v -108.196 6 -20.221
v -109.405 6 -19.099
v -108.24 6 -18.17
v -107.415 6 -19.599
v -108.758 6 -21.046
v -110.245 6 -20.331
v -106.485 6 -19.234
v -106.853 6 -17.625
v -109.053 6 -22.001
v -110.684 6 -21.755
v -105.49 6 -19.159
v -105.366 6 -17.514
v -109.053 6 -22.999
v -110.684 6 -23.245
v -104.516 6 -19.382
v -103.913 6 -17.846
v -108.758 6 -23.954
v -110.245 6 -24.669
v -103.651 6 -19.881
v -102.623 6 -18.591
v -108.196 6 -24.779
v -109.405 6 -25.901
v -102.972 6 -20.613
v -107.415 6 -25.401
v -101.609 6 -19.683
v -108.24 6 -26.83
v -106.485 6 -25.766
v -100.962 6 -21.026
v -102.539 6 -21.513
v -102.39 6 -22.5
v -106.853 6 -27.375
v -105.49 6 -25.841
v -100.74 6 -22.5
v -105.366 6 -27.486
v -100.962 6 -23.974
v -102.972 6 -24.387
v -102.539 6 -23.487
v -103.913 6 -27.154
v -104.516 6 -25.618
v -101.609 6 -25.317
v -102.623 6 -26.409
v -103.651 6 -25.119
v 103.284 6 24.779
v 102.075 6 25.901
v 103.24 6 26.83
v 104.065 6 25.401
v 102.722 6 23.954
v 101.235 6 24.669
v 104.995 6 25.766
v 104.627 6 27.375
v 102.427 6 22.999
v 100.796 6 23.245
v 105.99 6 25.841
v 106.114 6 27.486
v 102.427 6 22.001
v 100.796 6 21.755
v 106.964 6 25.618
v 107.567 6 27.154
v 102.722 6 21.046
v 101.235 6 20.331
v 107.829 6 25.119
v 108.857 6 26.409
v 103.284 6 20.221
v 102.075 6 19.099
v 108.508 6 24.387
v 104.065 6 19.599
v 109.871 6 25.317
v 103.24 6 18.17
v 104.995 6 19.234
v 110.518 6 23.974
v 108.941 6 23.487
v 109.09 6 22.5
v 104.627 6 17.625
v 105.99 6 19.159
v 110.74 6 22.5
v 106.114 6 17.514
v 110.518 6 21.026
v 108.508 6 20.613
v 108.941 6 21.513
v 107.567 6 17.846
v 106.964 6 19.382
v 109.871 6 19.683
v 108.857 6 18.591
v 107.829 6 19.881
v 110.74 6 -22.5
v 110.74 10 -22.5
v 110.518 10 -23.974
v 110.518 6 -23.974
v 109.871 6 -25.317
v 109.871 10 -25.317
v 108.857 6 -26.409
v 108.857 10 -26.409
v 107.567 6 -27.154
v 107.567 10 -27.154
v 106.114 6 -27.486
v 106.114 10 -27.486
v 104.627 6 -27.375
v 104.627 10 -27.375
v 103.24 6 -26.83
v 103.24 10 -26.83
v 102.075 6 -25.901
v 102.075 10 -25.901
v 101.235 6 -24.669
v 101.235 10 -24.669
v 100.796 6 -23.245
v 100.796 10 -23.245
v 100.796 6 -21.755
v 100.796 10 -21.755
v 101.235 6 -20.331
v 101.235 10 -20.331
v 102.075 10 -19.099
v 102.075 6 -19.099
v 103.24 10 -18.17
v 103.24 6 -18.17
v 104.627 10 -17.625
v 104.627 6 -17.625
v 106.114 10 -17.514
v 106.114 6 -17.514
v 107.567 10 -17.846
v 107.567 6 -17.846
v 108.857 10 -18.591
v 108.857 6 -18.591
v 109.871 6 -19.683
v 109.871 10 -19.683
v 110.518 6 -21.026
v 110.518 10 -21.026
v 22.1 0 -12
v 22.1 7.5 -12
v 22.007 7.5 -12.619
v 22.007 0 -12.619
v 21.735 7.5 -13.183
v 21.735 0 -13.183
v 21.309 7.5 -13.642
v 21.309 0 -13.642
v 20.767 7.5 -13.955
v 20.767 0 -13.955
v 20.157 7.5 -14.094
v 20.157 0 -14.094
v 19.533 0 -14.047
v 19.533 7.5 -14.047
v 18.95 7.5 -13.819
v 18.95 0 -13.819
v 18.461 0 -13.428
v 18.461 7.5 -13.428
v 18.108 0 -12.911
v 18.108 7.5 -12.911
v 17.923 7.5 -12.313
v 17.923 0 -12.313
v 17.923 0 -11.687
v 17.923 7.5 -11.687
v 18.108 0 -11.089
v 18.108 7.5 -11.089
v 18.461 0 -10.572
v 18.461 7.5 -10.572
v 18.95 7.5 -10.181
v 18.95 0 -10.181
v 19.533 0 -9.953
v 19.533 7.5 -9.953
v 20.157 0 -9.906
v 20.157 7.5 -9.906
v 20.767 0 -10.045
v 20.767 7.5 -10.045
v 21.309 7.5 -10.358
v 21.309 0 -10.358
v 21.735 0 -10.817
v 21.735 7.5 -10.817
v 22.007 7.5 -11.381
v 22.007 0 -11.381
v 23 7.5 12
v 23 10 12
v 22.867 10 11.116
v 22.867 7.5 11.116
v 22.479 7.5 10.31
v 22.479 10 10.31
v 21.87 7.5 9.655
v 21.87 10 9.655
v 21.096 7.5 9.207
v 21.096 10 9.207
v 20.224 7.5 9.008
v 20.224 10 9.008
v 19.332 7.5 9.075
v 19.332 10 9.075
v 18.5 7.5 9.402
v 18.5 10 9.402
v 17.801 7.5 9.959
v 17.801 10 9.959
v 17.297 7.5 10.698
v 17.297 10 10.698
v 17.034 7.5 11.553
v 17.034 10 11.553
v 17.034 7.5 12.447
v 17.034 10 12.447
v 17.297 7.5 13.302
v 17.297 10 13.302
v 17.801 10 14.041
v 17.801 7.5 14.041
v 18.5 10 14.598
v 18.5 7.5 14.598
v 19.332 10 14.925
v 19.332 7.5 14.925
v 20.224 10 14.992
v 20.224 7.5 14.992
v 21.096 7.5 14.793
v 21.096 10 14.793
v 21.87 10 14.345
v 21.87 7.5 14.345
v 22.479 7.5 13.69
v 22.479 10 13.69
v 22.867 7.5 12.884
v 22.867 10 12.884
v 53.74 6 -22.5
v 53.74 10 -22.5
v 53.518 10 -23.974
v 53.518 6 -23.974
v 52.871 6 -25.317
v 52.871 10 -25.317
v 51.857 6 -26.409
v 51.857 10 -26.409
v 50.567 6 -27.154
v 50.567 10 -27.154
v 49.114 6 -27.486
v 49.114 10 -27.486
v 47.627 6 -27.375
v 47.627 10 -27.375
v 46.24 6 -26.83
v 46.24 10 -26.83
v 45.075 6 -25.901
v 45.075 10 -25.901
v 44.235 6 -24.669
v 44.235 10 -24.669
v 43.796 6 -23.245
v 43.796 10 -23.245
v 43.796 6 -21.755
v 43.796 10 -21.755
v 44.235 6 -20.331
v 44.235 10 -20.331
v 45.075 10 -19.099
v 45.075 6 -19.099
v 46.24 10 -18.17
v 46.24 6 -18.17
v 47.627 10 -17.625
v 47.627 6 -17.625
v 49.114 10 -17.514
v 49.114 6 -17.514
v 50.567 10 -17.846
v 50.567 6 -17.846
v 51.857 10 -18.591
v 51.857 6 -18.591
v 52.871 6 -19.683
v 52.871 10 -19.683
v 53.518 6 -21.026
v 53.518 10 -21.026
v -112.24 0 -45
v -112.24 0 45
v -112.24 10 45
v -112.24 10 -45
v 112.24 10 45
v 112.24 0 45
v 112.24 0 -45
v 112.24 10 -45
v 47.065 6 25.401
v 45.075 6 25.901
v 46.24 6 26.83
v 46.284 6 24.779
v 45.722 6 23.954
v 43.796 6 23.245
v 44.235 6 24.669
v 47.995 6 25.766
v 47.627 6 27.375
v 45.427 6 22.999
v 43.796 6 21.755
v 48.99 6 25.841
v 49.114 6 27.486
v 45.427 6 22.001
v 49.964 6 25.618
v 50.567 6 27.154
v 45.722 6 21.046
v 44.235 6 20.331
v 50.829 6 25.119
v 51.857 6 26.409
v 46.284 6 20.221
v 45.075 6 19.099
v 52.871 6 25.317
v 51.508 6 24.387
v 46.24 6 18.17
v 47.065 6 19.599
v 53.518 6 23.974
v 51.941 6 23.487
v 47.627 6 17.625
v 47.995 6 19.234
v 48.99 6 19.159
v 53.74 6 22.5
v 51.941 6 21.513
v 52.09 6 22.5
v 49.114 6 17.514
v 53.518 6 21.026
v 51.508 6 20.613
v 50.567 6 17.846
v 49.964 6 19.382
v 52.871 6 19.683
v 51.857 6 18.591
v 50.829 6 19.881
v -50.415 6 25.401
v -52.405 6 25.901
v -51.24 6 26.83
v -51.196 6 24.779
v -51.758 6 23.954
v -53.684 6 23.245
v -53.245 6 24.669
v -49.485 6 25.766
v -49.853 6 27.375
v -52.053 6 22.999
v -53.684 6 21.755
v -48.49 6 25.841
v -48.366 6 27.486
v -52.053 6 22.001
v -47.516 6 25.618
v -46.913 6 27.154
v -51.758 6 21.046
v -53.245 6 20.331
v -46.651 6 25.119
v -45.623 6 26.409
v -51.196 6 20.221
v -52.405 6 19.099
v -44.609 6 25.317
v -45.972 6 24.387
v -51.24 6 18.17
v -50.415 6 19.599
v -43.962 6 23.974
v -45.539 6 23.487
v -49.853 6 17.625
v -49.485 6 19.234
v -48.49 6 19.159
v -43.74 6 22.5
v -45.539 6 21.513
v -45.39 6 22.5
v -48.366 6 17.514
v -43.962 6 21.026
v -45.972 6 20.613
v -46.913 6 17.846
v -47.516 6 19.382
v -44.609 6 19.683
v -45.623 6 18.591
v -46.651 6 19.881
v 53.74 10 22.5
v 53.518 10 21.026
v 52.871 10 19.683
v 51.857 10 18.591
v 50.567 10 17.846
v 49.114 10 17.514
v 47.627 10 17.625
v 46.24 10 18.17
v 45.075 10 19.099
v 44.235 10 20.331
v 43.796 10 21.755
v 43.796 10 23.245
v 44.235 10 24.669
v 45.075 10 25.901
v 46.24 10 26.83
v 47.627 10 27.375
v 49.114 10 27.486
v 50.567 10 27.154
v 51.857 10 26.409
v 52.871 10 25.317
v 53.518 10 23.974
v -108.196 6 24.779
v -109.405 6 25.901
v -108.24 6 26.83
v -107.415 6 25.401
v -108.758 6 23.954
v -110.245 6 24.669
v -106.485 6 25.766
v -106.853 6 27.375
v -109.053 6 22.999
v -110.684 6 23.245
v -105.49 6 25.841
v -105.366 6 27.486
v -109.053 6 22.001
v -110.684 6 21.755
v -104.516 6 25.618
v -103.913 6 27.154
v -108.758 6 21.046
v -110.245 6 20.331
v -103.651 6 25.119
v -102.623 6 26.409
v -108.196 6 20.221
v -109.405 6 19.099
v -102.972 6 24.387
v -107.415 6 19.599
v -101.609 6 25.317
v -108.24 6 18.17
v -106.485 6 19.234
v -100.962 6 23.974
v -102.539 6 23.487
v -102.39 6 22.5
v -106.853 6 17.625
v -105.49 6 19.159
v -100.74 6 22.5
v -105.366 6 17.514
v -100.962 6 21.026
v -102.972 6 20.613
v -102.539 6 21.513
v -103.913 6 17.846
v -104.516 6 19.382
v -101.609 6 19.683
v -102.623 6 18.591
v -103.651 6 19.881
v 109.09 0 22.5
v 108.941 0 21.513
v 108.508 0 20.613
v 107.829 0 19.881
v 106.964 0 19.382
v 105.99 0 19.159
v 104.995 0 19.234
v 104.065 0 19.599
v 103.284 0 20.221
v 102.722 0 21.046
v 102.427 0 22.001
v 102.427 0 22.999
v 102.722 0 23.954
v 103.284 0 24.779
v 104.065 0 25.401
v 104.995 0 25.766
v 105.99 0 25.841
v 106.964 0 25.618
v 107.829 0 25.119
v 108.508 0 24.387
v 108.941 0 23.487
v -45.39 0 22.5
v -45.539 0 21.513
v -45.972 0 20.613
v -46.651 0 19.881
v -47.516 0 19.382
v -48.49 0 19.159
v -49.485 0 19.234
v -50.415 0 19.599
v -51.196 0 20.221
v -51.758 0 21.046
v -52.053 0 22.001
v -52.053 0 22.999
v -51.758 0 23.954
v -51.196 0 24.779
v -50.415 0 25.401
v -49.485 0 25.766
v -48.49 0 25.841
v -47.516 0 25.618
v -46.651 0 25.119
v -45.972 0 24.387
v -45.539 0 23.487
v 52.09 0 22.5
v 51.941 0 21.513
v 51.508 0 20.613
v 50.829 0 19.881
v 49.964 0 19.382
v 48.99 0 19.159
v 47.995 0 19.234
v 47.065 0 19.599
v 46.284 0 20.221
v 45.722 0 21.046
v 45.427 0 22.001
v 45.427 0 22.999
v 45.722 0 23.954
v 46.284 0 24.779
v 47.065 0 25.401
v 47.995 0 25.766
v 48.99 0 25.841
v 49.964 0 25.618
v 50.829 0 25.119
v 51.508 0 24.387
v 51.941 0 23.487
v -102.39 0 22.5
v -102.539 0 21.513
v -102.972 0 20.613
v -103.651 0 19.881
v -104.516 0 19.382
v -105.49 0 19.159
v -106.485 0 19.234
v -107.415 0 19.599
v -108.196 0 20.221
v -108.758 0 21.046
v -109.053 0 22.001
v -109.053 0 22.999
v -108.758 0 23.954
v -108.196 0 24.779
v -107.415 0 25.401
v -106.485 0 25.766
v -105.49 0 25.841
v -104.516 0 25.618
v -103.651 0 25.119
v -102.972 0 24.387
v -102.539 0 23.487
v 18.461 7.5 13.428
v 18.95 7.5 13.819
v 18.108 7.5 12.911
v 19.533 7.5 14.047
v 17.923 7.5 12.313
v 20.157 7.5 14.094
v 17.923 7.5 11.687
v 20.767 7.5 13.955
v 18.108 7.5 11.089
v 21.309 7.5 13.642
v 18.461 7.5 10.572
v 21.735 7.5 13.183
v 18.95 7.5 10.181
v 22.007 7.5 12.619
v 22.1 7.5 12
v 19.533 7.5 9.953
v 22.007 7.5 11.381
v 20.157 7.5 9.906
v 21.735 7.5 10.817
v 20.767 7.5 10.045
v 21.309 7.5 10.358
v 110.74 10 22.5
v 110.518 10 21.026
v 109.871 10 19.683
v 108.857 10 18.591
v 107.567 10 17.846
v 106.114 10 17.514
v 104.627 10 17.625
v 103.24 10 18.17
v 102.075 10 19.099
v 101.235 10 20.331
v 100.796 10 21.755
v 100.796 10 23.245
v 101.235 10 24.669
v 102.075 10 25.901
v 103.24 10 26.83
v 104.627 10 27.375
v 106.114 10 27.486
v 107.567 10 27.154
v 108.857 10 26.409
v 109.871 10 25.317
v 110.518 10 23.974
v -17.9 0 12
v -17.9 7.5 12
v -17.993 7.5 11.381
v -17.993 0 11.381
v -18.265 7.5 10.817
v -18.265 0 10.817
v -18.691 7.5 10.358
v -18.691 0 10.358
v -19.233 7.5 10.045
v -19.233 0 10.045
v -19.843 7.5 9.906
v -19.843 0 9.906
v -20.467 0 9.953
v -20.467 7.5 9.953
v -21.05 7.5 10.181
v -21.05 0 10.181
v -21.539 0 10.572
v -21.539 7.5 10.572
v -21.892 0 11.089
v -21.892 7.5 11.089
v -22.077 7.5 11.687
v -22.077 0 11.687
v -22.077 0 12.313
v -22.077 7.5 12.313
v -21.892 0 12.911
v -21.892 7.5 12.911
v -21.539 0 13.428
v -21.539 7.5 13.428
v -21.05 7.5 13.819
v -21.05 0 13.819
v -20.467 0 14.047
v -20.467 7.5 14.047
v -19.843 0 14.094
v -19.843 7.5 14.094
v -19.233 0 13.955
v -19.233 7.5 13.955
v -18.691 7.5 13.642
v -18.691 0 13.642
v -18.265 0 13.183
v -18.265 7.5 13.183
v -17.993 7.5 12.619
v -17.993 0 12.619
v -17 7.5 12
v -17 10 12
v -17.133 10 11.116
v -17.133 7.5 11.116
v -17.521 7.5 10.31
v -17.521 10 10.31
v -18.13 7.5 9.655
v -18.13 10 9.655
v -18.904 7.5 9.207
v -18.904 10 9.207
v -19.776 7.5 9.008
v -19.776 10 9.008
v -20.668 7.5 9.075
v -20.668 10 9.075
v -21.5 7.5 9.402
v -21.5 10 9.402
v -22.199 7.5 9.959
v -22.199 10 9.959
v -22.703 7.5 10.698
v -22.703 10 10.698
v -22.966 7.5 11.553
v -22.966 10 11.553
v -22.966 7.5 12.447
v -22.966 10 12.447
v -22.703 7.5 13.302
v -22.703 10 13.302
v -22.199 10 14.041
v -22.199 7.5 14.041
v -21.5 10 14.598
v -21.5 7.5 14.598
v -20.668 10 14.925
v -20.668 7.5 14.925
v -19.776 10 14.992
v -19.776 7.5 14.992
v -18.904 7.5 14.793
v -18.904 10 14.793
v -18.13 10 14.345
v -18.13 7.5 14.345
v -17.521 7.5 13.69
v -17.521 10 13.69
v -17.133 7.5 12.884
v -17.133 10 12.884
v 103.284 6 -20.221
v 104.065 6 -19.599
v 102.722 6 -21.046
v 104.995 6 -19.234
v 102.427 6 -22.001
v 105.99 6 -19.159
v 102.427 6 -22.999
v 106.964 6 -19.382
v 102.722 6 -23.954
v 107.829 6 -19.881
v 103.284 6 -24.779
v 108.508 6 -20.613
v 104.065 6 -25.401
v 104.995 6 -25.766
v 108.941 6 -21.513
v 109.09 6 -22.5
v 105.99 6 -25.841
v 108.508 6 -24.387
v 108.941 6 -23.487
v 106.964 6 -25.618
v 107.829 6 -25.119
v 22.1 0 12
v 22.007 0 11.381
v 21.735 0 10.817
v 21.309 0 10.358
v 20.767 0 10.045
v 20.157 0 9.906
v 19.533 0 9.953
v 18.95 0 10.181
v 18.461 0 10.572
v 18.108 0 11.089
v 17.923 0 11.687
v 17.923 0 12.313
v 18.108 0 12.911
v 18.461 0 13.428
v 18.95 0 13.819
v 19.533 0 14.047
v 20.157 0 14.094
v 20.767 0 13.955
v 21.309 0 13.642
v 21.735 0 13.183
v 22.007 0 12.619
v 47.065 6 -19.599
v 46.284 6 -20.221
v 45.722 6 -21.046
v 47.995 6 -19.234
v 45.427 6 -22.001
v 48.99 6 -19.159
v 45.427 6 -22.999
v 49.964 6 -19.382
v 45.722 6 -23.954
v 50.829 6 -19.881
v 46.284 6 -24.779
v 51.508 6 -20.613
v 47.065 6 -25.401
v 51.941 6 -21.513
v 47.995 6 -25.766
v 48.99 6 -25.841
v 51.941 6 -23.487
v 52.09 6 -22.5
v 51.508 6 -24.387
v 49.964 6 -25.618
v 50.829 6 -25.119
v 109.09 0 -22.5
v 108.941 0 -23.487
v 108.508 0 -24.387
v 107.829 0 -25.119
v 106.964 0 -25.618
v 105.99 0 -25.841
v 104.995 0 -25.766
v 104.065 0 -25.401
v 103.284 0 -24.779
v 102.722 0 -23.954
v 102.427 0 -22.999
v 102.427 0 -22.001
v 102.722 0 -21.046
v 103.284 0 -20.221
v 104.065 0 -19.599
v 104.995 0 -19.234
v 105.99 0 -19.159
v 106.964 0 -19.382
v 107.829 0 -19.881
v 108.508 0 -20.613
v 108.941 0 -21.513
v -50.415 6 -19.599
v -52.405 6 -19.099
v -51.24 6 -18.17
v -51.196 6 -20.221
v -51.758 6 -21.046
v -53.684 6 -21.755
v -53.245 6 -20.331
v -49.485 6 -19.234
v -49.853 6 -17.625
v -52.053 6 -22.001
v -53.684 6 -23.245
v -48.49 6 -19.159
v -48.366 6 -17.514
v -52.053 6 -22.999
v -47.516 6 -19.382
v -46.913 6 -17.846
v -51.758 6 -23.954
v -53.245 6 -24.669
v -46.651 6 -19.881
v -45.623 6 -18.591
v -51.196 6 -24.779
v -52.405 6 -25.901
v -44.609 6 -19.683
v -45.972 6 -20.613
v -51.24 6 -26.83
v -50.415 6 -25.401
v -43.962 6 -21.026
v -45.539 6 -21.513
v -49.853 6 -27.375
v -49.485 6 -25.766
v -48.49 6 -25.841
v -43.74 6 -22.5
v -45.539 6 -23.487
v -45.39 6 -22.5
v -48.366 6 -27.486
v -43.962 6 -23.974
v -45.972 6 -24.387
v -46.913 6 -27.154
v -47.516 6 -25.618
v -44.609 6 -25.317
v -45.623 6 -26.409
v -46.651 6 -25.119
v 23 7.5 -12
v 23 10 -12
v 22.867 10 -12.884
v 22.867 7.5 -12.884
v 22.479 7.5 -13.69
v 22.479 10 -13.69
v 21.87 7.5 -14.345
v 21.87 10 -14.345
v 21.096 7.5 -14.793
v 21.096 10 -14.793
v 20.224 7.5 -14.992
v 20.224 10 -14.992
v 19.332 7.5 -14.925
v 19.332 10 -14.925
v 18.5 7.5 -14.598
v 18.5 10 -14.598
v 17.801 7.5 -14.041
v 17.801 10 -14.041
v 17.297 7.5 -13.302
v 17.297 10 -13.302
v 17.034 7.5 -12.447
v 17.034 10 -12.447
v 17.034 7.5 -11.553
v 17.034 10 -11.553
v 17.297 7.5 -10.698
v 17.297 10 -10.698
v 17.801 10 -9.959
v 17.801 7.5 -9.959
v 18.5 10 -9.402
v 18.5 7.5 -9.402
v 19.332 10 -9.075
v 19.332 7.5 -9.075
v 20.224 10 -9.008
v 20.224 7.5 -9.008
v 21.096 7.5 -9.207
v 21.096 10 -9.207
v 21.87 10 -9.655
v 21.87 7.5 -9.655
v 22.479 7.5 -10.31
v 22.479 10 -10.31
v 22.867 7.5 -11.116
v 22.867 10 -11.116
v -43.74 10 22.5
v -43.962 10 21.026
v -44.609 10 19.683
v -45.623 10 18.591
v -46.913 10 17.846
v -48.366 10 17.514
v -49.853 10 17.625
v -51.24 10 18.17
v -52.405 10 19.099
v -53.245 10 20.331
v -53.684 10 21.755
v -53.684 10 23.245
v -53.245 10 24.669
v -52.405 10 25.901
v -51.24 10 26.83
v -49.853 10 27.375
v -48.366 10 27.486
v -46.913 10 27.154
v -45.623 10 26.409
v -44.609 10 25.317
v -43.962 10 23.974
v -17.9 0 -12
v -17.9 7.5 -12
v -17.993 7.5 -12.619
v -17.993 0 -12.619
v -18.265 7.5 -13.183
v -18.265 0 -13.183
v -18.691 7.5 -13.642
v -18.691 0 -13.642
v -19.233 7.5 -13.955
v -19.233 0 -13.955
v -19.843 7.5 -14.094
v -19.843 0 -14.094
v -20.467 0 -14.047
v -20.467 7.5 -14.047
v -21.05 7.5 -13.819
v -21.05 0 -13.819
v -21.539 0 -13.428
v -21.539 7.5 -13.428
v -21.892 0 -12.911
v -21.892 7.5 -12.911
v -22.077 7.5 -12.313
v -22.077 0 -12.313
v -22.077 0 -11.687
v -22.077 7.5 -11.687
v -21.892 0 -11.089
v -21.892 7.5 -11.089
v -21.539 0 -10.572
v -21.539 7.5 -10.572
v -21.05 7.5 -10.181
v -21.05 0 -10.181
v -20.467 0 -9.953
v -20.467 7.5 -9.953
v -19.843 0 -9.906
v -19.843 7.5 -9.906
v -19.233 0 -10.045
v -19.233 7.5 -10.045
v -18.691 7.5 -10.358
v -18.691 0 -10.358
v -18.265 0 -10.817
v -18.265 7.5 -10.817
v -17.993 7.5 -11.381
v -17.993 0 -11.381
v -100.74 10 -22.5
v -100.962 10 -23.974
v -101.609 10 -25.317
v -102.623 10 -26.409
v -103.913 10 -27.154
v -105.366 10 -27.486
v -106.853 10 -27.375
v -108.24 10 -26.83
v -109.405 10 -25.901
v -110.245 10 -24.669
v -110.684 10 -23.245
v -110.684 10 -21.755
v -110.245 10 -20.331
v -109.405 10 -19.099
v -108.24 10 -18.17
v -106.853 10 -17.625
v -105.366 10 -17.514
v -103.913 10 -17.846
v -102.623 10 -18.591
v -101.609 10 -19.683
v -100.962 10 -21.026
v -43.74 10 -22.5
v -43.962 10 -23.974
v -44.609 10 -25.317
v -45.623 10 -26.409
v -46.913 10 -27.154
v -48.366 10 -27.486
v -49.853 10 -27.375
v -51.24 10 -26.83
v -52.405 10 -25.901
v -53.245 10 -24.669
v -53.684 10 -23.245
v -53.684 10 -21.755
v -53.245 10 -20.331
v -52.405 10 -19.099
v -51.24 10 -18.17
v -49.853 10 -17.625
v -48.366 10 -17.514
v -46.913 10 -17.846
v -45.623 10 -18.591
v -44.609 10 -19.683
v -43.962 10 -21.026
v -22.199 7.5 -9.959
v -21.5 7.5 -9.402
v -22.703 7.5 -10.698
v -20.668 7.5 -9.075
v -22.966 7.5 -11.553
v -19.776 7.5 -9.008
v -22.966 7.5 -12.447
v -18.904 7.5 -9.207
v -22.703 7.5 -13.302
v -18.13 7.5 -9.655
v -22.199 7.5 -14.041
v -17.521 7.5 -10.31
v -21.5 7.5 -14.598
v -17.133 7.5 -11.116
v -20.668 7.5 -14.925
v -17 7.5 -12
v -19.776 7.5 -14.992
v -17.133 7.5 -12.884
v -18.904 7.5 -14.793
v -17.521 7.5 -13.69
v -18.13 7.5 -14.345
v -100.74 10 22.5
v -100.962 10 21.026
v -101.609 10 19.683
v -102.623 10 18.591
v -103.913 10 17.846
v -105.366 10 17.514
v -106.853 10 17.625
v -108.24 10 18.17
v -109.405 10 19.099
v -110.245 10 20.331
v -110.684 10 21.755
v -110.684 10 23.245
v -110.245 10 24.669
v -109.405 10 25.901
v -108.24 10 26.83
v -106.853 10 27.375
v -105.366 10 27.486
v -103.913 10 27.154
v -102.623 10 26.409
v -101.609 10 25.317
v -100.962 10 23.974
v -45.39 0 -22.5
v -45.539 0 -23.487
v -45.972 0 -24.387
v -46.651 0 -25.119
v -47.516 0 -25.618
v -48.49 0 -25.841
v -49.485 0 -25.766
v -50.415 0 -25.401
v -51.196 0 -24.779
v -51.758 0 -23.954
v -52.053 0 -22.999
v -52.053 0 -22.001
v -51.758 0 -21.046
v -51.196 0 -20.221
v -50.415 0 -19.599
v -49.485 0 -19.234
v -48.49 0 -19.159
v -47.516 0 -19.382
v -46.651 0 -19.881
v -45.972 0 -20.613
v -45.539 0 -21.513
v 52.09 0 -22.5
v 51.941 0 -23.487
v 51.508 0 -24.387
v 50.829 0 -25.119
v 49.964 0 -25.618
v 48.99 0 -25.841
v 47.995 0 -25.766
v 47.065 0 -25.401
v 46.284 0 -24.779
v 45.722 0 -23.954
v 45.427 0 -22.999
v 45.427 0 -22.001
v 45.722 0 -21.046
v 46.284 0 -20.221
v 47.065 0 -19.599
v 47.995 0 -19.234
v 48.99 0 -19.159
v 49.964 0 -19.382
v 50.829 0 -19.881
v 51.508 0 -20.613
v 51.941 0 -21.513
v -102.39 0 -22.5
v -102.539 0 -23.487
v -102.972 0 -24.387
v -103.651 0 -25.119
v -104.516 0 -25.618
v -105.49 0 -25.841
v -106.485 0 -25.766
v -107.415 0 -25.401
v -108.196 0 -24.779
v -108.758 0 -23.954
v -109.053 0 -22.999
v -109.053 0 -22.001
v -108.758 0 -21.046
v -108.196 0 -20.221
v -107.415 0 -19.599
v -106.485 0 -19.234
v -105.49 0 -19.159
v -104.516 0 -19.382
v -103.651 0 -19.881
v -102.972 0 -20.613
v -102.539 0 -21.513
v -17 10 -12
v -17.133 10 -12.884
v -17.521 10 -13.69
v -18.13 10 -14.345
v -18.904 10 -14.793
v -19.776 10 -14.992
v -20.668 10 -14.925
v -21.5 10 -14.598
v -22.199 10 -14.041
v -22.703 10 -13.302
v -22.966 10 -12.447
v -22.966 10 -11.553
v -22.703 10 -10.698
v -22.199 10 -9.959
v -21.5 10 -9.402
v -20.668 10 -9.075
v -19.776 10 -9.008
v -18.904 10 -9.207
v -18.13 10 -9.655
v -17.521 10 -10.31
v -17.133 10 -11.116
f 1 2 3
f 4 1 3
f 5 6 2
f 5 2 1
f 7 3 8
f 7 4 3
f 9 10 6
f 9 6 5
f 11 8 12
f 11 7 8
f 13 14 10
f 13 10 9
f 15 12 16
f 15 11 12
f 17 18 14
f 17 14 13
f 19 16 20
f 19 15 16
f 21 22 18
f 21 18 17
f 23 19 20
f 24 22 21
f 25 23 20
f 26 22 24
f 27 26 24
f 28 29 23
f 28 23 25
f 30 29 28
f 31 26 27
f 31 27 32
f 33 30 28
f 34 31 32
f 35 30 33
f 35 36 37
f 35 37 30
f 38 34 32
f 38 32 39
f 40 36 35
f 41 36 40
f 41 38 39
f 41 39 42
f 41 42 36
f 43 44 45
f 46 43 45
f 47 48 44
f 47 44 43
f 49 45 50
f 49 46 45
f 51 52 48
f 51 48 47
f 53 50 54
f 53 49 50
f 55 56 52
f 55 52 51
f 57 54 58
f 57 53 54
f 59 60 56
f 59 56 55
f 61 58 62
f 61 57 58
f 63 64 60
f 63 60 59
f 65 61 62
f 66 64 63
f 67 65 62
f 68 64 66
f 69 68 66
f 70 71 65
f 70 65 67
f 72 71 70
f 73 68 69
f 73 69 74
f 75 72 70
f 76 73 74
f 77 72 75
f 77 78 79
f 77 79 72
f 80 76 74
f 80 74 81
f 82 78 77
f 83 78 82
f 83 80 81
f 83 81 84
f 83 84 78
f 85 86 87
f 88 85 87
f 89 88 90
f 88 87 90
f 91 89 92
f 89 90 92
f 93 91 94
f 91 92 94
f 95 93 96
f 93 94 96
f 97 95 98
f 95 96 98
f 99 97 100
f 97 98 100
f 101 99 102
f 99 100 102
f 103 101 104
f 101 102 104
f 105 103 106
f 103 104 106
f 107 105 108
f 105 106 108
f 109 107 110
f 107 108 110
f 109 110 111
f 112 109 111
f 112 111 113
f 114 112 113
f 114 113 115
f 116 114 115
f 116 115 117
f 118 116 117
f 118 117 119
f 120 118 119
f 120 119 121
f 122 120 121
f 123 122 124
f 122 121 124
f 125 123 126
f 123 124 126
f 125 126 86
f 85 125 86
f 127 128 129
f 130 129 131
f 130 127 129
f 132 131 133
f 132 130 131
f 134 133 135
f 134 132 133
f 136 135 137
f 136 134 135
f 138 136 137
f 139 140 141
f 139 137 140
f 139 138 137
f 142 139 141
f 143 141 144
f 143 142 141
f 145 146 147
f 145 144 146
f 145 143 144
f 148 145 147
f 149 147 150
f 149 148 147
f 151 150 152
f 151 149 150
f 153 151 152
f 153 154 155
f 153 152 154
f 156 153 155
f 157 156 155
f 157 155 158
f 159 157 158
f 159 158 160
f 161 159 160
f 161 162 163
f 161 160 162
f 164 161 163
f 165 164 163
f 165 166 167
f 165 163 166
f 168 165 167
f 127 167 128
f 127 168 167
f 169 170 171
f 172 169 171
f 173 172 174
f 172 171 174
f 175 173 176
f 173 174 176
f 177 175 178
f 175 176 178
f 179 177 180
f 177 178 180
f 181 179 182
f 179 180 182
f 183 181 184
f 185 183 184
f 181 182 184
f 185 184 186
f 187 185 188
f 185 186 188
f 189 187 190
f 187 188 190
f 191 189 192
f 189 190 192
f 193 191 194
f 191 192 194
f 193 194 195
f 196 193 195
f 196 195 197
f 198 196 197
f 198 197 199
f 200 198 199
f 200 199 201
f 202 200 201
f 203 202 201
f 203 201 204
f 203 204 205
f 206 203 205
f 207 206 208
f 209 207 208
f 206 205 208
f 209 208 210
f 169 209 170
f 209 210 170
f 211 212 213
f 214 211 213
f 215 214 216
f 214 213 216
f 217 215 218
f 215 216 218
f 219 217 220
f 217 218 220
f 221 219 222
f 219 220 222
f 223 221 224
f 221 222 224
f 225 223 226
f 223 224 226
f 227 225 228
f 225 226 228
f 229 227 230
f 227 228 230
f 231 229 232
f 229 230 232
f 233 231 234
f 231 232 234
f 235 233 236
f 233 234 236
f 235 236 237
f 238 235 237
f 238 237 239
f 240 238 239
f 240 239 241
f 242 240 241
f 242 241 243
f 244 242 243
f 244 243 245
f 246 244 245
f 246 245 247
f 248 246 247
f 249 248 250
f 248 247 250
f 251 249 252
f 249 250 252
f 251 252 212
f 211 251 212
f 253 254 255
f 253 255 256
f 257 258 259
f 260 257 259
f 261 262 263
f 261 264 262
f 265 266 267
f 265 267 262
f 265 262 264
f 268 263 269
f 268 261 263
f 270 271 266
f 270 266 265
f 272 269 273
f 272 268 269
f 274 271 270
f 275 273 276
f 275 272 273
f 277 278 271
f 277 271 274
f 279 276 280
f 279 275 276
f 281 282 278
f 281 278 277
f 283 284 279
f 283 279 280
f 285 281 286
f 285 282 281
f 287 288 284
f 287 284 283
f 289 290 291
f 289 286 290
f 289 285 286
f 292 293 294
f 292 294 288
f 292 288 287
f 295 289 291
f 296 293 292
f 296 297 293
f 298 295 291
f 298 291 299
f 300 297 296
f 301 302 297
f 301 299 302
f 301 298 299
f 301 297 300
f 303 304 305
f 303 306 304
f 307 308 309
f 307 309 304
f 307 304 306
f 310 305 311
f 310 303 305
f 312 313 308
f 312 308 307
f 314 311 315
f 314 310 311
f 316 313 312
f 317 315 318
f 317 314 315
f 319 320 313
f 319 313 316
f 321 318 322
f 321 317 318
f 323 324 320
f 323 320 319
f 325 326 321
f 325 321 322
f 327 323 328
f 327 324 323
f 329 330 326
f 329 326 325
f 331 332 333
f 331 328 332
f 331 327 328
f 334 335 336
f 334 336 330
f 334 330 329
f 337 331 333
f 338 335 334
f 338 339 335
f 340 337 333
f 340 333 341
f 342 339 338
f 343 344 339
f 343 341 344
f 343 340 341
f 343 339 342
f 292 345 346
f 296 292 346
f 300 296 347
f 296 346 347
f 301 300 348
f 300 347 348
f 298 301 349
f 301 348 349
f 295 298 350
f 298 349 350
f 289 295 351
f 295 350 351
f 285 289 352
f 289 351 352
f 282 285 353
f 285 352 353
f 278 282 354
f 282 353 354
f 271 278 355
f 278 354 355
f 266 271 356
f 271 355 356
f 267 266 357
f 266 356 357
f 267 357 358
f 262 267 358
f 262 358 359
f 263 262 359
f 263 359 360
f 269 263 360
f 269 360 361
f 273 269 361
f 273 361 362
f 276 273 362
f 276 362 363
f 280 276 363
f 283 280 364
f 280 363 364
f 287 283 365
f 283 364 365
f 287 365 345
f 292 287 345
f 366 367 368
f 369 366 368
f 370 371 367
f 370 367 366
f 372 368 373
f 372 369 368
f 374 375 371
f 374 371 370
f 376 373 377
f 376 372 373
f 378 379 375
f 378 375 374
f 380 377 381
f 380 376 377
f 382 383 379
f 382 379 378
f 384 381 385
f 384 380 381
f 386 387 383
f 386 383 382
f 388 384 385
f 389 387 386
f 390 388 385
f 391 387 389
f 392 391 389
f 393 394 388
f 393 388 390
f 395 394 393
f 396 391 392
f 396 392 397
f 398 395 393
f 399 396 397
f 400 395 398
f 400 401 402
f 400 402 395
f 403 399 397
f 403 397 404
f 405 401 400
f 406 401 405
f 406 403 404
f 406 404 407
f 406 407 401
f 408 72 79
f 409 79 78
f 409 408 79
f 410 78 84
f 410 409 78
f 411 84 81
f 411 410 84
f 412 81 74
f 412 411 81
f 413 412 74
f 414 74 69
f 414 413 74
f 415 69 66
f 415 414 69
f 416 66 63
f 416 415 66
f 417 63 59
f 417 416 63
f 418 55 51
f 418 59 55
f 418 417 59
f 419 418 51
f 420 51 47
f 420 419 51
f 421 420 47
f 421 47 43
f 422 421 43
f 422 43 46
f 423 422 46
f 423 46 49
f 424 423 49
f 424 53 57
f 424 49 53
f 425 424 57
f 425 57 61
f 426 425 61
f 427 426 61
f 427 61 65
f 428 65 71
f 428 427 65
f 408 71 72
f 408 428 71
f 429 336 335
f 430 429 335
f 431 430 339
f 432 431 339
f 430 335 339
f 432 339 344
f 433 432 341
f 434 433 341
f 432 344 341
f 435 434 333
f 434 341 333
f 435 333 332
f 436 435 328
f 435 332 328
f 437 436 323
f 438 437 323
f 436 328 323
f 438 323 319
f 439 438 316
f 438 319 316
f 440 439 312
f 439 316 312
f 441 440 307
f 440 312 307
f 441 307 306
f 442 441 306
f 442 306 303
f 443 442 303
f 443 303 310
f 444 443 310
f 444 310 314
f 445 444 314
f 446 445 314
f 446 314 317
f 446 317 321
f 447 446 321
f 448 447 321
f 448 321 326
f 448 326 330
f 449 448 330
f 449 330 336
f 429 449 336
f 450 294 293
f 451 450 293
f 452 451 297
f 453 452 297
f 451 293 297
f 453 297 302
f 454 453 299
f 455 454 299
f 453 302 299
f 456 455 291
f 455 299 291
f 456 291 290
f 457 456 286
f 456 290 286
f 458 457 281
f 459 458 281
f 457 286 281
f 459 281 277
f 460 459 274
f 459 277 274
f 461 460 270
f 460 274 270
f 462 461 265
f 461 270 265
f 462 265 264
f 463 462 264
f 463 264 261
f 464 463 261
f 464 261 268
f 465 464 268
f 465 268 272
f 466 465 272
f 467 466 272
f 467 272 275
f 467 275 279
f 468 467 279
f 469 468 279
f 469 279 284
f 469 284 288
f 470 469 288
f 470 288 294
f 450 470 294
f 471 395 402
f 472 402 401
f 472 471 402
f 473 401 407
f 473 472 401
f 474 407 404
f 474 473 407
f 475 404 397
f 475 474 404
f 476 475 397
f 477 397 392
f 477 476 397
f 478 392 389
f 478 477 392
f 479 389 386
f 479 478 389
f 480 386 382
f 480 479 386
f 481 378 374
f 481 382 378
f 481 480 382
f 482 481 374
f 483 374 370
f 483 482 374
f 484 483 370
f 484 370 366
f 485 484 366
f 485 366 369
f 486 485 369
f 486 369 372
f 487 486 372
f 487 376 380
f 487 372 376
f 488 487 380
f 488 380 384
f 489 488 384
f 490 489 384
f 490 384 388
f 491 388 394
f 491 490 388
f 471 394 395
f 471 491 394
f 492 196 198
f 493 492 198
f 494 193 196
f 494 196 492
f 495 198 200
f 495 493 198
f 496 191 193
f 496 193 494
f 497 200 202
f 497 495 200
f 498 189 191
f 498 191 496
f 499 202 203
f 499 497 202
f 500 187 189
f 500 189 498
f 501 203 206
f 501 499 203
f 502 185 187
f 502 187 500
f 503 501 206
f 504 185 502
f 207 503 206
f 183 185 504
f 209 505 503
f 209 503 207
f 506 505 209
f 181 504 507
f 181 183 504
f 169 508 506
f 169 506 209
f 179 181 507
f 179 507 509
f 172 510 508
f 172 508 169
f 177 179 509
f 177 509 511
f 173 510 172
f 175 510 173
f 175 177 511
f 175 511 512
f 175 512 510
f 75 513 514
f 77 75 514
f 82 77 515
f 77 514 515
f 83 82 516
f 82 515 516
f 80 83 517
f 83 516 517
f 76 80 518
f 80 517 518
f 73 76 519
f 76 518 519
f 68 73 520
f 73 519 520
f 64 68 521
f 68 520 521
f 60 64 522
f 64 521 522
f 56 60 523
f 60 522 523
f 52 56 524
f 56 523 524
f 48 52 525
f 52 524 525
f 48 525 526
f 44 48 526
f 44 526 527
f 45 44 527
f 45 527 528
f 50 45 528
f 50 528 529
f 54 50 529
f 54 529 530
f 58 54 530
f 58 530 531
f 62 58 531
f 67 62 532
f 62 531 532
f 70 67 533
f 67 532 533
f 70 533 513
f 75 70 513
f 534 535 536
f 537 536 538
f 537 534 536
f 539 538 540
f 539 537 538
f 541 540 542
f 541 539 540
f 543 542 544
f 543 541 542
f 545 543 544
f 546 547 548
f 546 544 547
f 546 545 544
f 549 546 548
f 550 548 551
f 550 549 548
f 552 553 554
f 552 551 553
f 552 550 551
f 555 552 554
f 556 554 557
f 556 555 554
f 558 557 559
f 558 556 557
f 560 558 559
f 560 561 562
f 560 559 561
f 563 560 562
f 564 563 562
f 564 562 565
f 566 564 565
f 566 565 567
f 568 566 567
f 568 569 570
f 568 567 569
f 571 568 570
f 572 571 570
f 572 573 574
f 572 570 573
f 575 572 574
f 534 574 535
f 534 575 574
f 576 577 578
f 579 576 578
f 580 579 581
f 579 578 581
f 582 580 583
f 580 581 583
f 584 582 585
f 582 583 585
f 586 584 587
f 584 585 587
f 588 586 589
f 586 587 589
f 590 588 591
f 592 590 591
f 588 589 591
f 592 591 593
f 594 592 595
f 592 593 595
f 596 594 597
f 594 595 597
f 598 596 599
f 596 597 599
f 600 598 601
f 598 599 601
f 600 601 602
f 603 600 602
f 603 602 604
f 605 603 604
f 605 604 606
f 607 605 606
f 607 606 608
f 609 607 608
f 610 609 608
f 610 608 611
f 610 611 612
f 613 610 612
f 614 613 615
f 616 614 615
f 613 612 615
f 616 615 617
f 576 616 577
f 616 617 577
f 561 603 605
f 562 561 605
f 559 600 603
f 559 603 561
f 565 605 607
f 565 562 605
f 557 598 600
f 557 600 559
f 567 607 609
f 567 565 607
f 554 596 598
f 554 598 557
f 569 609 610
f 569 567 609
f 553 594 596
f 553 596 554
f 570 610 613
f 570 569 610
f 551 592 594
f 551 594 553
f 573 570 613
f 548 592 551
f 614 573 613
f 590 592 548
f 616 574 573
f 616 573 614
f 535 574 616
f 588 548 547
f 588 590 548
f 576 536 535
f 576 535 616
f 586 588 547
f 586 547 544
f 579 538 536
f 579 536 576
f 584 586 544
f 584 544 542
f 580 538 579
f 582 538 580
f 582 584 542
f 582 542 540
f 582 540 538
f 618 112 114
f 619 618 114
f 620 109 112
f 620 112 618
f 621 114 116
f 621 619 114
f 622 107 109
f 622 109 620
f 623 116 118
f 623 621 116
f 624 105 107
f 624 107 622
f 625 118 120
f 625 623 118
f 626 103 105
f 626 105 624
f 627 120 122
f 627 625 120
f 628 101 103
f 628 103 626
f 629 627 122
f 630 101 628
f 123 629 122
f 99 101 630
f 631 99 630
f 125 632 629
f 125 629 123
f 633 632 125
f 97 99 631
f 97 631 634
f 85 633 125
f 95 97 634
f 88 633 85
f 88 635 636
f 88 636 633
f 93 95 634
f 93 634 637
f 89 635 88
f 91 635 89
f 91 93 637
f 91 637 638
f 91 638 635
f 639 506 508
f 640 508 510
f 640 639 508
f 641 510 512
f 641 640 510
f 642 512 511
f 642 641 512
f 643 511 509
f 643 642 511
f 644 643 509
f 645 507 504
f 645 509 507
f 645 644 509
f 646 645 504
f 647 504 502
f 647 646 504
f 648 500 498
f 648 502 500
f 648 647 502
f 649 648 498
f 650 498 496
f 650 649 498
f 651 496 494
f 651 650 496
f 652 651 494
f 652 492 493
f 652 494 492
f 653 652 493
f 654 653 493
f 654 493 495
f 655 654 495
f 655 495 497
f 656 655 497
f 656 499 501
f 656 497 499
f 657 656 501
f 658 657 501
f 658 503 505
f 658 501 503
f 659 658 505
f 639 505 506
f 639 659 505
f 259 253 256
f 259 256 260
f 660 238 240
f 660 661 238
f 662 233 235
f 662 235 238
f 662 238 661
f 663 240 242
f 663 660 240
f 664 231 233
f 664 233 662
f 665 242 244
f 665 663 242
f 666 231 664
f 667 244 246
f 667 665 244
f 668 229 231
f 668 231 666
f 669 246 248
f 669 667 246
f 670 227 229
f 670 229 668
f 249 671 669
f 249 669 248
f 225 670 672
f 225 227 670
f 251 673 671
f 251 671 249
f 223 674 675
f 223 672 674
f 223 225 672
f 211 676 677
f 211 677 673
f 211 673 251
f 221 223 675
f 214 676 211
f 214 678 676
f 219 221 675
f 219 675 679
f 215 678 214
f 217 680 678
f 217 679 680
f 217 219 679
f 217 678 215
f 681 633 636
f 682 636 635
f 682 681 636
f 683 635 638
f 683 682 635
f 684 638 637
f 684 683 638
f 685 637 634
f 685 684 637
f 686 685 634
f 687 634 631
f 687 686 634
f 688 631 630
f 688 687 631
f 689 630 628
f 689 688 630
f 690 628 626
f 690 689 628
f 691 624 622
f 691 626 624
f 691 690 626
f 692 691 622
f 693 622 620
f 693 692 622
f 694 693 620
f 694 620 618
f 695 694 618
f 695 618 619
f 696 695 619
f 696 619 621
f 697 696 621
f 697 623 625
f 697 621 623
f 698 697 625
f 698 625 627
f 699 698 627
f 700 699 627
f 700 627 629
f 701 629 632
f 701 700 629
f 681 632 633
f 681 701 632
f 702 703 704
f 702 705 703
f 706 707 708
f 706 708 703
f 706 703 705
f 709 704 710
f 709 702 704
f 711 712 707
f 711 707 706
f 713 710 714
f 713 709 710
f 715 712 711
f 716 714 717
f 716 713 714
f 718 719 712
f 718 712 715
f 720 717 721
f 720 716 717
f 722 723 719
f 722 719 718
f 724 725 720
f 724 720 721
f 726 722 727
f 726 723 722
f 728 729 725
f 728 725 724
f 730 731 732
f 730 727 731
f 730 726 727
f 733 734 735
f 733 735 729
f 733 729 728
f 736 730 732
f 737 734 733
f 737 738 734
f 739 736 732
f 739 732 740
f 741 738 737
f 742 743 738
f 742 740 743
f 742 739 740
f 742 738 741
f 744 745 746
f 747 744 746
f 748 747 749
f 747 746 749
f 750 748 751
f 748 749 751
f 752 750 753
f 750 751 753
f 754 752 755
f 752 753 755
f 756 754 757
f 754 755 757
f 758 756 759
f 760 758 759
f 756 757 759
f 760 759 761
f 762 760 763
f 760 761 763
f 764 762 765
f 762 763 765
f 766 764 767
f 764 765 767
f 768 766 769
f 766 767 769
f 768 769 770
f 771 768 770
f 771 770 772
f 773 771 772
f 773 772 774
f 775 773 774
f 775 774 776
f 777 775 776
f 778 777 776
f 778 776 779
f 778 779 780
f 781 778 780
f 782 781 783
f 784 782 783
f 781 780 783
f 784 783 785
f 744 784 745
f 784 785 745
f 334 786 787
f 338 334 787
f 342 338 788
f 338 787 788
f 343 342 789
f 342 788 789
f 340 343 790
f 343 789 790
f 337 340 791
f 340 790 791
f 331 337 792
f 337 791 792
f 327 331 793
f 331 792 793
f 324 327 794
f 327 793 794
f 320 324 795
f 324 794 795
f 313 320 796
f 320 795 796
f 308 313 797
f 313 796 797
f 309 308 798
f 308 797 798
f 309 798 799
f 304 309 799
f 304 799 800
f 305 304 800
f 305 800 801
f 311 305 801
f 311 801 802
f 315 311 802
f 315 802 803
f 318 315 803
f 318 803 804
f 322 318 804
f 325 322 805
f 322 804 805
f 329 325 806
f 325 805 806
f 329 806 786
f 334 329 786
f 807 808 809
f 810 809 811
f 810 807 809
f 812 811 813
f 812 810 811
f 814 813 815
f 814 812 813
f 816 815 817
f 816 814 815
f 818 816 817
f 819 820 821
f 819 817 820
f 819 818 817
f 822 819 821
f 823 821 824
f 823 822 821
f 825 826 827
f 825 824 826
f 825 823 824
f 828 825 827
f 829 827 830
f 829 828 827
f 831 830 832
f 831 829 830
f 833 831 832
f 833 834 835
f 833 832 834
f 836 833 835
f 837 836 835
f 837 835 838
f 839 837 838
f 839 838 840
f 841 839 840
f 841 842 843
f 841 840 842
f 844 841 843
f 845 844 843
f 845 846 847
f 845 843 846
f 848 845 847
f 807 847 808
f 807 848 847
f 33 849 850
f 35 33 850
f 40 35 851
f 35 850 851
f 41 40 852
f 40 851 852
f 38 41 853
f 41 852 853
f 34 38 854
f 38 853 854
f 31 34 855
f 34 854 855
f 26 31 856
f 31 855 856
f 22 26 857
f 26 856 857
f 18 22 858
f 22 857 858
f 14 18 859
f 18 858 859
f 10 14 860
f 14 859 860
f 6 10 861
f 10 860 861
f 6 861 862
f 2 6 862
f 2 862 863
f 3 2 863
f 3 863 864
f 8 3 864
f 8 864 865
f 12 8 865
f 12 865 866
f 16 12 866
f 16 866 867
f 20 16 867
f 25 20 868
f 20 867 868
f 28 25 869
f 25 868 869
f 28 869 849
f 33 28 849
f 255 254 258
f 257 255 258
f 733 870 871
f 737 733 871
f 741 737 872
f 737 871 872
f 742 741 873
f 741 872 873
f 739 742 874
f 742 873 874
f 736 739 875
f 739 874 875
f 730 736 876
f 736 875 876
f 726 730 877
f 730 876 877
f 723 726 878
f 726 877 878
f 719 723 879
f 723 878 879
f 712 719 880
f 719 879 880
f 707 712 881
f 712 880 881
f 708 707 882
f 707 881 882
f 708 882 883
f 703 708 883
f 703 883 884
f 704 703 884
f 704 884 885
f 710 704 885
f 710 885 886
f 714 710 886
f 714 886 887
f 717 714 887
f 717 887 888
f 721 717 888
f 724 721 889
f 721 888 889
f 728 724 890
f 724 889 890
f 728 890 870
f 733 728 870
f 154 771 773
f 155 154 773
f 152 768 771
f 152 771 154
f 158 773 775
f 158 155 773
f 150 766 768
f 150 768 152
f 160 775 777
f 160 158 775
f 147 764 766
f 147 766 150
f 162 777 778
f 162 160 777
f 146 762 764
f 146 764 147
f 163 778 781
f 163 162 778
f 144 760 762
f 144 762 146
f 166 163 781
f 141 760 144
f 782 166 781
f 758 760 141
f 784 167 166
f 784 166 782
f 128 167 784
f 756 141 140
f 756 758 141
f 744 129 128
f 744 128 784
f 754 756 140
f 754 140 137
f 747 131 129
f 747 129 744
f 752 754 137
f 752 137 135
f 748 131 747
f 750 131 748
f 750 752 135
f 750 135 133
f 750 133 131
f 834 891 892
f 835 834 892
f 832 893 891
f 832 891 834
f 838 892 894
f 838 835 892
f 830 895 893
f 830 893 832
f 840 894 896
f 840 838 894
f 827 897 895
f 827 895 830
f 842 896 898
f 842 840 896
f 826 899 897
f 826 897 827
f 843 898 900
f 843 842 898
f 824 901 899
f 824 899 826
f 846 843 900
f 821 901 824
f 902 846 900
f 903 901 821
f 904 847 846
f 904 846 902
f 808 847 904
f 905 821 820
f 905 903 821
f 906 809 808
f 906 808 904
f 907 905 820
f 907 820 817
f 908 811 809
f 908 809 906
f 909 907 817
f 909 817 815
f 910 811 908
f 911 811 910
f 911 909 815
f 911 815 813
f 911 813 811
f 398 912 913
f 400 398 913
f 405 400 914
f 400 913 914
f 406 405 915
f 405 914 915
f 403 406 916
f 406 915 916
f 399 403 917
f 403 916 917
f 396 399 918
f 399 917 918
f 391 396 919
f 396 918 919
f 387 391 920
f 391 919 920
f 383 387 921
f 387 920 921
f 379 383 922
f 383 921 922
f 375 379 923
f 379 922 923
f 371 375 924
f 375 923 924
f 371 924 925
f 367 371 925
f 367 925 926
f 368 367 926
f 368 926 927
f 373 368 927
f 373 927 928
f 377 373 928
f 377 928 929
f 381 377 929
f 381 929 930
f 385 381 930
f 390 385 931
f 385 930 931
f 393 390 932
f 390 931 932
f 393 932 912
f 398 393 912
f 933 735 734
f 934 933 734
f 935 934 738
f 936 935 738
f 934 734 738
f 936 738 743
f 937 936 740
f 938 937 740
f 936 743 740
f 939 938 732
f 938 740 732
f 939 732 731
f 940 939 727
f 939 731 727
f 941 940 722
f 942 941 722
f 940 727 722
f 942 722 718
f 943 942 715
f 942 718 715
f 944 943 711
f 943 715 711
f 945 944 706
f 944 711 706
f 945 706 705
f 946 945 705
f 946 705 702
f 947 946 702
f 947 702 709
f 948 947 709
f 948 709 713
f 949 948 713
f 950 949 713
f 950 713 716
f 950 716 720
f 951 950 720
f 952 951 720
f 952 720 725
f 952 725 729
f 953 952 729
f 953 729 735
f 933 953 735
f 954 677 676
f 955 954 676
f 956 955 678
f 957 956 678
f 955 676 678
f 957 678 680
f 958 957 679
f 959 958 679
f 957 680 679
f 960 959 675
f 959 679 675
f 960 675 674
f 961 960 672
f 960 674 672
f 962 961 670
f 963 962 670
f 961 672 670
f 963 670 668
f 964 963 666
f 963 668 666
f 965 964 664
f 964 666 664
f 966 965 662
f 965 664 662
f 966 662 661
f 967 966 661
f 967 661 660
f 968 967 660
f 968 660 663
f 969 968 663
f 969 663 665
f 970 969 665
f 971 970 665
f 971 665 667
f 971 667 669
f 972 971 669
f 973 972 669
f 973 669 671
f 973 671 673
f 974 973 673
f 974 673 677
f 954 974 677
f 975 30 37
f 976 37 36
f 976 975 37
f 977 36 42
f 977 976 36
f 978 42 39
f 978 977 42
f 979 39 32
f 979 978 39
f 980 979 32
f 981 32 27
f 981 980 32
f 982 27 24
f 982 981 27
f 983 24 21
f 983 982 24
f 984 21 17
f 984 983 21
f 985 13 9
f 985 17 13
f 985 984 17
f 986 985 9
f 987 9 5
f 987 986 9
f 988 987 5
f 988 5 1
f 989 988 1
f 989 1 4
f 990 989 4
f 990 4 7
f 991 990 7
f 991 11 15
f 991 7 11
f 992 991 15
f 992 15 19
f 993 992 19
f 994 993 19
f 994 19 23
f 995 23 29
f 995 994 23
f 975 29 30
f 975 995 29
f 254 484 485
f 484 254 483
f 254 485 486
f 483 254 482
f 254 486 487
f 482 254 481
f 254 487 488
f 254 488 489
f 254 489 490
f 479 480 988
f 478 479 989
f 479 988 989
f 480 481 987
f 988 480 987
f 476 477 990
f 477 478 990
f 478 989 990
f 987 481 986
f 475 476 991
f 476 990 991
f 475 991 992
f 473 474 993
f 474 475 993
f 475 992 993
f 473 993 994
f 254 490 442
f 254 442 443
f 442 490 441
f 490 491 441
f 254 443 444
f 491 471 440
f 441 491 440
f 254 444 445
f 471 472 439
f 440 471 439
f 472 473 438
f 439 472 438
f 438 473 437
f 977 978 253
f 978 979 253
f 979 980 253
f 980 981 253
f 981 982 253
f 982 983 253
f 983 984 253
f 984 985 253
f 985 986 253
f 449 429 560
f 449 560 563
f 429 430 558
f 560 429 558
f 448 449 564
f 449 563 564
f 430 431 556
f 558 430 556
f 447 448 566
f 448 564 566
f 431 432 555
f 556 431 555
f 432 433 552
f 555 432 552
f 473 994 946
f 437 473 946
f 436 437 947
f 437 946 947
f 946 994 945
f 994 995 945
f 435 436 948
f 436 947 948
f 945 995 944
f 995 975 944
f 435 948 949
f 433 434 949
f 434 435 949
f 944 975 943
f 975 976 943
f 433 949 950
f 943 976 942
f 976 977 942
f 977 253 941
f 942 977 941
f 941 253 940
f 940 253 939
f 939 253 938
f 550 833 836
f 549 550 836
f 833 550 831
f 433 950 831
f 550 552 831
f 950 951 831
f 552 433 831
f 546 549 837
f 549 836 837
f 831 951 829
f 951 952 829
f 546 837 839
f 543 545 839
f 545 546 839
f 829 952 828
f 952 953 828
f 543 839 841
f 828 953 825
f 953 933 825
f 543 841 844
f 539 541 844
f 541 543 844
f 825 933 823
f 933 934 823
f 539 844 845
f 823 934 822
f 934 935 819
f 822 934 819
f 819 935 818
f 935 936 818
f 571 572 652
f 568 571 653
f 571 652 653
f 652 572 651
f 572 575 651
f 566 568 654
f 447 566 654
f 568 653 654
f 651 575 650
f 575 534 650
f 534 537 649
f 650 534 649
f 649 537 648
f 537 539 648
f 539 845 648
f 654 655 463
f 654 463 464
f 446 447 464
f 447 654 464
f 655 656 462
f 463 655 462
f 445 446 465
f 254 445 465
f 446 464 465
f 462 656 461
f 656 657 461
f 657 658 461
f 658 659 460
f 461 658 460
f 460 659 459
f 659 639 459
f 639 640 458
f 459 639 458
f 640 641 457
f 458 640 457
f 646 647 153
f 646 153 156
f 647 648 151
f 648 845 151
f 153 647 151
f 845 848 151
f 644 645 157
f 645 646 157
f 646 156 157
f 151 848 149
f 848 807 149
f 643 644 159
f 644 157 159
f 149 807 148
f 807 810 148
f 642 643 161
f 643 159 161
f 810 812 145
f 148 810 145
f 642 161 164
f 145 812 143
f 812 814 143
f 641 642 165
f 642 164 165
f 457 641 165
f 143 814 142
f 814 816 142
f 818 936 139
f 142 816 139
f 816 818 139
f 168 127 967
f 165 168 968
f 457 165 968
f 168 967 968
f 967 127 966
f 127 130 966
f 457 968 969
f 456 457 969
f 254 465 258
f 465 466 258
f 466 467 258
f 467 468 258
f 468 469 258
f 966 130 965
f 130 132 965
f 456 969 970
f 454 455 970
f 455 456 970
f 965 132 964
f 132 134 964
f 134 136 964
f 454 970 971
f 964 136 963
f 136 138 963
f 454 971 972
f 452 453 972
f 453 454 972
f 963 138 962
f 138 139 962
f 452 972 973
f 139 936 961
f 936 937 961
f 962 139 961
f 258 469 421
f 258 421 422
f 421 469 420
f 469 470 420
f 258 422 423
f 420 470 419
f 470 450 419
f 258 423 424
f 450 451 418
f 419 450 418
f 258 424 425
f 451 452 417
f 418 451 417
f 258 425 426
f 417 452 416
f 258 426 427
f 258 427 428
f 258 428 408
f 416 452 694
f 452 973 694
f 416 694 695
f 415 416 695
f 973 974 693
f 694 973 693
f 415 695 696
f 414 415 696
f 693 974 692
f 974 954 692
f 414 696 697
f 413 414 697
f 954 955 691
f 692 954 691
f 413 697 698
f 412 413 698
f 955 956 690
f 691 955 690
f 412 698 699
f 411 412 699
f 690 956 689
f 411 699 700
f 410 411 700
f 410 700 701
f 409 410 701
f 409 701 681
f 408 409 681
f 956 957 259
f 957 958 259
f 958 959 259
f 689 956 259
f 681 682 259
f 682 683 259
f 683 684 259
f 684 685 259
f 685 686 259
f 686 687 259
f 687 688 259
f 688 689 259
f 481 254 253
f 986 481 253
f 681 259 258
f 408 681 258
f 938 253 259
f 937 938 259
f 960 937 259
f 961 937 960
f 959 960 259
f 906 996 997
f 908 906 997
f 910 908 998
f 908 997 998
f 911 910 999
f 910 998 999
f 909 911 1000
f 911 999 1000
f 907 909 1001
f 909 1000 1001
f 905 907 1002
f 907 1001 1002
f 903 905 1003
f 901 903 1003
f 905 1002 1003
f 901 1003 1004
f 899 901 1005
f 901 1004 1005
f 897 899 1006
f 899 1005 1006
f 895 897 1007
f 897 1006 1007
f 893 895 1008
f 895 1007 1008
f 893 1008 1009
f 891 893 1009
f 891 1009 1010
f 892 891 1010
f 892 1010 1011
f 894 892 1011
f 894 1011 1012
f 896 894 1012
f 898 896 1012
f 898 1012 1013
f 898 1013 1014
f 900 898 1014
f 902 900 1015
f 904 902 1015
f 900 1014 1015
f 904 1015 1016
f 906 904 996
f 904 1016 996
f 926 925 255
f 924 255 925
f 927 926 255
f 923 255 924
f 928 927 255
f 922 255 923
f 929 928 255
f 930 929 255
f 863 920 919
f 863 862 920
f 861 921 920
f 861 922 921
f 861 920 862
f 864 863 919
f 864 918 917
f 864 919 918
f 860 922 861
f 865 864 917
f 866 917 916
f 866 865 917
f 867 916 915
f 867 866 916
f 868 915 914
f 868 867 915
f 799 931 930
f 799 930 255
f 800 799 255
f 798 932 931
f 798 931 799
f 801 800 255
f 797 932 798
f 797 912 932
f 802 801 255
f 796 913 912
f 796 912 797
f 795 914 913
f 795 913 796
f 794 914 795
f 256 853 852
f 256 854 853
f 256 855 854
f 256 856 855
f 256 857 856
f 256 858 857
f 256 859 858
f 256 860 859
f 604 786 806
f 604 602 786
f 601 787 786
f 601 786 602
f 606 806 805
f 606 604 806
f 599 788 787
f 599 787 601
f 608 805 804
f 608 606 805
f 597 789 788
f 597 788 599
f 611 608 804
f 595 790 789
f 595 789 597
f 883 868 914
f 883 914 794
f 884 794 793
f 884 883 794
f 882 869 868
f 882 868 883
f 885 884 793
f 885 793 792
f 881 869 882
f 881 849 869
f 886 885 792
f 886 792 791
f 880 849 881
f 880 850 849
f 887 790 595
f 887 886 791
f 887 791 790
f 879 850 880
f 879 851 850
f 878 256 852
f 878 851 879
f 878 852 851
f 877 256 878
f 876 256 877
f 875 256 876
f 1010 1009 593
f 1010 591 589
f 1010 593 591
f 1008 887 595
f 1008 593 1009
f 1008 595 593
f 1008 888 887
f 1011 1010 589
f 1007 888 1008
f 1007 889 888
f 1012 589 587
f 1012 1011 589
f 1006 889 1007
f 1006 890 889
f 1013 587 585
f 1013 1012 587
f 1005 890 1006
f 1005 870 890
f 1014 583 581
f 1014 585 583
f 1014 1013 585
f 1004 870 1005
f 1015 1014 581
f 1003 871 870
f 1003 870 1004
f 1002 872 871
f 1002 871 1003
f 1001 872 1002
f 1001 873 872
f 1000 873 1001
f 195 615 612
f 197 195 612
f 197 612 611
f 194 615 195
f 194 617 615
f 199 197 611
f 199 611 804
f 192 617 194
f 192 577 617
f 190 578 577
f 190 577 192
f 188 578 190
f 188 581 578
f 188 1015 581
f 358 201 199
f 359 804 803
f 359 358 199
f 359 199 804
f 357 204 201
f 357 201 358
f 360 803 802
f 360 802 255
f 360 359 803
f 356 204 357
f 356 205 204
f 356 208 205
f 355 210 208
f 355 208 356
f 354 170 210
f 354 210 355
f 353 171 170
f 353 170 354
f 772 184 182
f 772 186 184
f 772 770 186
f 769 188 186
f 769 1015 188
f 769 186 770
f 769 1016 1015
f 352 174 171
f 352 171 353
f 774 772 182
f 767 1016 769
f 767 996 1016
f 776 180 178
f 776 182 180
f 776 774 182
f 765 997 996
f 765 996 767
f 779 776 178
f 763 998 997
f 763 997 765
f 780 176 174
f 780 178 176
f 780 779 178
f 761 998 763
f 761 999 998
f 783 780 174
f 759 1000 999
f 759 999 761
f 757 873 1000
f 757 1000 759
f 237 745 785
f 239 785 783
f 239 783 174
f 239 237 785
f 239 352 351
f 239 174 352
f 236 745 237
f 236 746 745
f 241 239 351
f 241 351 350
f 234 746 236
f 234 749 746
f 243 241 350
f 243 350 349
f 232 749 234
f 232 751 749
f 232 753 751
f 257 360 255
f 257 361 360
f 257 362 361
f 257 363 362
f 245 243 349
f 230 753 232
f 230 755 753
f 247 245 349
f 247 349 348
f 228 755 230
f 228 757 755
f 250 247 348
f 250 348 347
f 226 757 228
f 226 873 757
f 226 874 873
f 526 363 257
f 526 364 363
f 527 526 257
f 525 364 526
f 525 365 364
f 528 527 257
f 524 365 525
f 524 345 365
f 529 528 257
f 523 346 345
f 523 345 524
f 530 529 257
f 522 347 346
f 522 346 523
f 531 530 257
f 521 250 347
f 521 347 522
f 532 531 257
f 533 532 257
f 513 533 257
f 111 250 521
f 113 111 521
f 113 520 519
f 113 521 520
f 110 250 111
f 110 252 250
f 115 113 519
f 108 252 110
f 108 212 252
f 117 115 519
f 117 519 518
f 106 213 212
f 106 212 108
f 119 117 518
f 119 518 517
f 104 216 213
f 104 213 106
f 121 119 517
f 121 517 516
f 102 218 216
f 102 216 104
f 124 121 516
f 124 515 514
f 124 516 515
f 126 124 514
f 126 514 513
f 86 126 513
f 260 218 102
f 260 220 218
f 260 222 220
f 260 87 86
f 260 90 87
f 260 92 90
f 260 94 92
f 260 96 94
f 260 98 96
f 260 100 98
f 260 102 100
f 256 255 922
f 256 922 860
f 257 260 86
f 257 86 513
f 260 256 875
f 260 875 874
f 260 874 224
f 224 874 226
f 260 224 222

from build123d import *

# Parameters (mm, degrees)
CROQUIS1_W              = 224.48
CROQUIS1_H              = 90
SALIENTE_EXTRUIR1_DEPTH = 10
CROQUIS2_R              = 3.35
CORTAR_EXTRUIR1_DEPTH   = 11
CROQUIS22_R             = 2.1
CORTAR_EXTRUIR3_DEPTH   = 11
CROQUIS25_R             = 5
CORTAR_EXTRUIR4_DEPTH   = 4
CROQUIS26_R             = 3
CORTAR_EXTRUIR5_DEPTH   = 2.5
CROQUIS27_R             = 3.35
CORTAR_EXTRUIR6_DEPTH   = 11
CROQUIS28_R             = 5
CORTAR_EXTRUIR7_DEPTH   = 4


with BuildPart() as part:
    # Croquis1 → Saliente-Extruir1 (new body)
    with BuildSketch(Plane(origin=(0, 0, 0), x_dir=(1, 0, 0), z_dir=(0, 1, 0))):
        Rectangle(CROQUIS1_W, CROQUIS1_H)
    extrude(amount=SALIENTE_EXTRUIR1_DEPTH)

    # Croquis2 → Cortar-Extruir1 (cut, through all)
    with BuildSketch(Plane(origin=(0, 0, 0), x_dir=(1, 0, 0), z_dir=(0, 1, 0))):
        with Locations((-105.74, 22.5)):
            Circle(CROQUIS2_R)
        with Locations((105.74, 22.5)):
            Circle(CROQUIS2_R)
        with Locations((105.74, -22.5)):
            Circle(CROQUIS2_R)
        with Locations((-105.74, -22.5)):
            Circle(CROQUIS2_R)
    extrude(amount=CORTAR_EXTRUIR1_DEPTH, mode=Mode.SUBTRACT)

    # Croquis22 → Cortar-Extruir3 (cut, through all)
    with BuildSketch(Plane(origin=(0, 0, 0), x_dir=(1, 0, 0), z_dir=(0, 1, 0))):
        with Locations((20, 12)):
            Circle(CROQUIS22_R)
        with Locations((-20, 12)):
            Circle(CROQUIS22_R)
        with Locations((-20, -12)):
            Circle(CROQUIS22_R)
        with Locations((20, -12)):
            Circle(CROQUIS22_R)
    extrude(amount=CORTAR_EXTRUIR3_DEPTH, mode=Mode.SUBTRACT)

    # Croquis25 → Cortar-Extruir4 (cut)
    with BuildSketch(Plane(origin=(0, 10, 0), x_dir=(1, 0, 0), z_dir=(0, 1, 0))):
        with Locations((-105.74, 22.5)):
            Circle(CROQUIS25_R)
        with Locations((-105.74, -22.5)):
            Circle(CROQUIS25_R)
        with Locations((105.74, 22.5)):
            Circle(CROQUIS25_R)
        with Locations((105.74, -22.5)):
            Circle(CROQUIS25_R)
    extrude(amount=-CORTAR_EXTRUIR4_DEPTH, mode=Mode.SUBTRACT)

    # Croquis26 → Cortar-Extruir5 (cut)
    with BuildSketch(Plane(origin=(0, 10, 0), x_dir=(1, 0, 0), z_dir=(0, 1, 0))):
        with Locations((-20, 12)):
            Circle(CROQUIS26_R)
        with Locations((20, 12)):
            Circle(CROQUIS26_R)
        with Locations((20, -12)):
            Circle(CROQUIS26_R)
        with Locations((-20, -12)):
            Circle(CROQUIS26_R)
    extrude(amount=-CORTAR_EXTRUIR5_DEPTH, mode=Mode.SUBTRACT)

    # Croquis27 → Cortar-Extruir6 (cut, through all)
    with BuildSketch(Plane(origin=(0, 10, 0), x_dir=(1, 0, 0), z_dir=(0, 1, 0))):
        with Locations((-48.74, 22.5)):
            Circle(CROQUIS27_R)
        with Locations((48.74, 22.5)):
            Circle(CROQUIS27_R)
        with Locations((48.74, -22.5)):
            Circle(CROQUIS27_R)
        with Locations((-48.74, -22.5)):
            Circle(CROQUIS27_R)
    extrude(amount=-CORTAR_EXTRUIR6_DEPTH, mode=Mode.SUBTRACT)

    # Croquis28 → Cortar-Extruir7 (cut)
    with BuildSketch(Plane(origin=(0, 10, 0), x_dir=(1, 0, 0), z_dir=(0, 1, 0))):
        with Locations((-48.74, 22.5)):
            Circle(CROQUIS28_R)
        with Locations((-48.74, -22.5)):
            Circle(CROQUIS28_R)
        with Locations((48.74, -22.5)):
            Circle(CROQUIS28_R)
        with Locations((48.74, 22.5)):
            Circle(CROQUIS28_R)
    extrude(amount=-CORTAR_EXTRUIR7_DEPTH, mode=Mode.SUBTRACT)


solid = part.part
